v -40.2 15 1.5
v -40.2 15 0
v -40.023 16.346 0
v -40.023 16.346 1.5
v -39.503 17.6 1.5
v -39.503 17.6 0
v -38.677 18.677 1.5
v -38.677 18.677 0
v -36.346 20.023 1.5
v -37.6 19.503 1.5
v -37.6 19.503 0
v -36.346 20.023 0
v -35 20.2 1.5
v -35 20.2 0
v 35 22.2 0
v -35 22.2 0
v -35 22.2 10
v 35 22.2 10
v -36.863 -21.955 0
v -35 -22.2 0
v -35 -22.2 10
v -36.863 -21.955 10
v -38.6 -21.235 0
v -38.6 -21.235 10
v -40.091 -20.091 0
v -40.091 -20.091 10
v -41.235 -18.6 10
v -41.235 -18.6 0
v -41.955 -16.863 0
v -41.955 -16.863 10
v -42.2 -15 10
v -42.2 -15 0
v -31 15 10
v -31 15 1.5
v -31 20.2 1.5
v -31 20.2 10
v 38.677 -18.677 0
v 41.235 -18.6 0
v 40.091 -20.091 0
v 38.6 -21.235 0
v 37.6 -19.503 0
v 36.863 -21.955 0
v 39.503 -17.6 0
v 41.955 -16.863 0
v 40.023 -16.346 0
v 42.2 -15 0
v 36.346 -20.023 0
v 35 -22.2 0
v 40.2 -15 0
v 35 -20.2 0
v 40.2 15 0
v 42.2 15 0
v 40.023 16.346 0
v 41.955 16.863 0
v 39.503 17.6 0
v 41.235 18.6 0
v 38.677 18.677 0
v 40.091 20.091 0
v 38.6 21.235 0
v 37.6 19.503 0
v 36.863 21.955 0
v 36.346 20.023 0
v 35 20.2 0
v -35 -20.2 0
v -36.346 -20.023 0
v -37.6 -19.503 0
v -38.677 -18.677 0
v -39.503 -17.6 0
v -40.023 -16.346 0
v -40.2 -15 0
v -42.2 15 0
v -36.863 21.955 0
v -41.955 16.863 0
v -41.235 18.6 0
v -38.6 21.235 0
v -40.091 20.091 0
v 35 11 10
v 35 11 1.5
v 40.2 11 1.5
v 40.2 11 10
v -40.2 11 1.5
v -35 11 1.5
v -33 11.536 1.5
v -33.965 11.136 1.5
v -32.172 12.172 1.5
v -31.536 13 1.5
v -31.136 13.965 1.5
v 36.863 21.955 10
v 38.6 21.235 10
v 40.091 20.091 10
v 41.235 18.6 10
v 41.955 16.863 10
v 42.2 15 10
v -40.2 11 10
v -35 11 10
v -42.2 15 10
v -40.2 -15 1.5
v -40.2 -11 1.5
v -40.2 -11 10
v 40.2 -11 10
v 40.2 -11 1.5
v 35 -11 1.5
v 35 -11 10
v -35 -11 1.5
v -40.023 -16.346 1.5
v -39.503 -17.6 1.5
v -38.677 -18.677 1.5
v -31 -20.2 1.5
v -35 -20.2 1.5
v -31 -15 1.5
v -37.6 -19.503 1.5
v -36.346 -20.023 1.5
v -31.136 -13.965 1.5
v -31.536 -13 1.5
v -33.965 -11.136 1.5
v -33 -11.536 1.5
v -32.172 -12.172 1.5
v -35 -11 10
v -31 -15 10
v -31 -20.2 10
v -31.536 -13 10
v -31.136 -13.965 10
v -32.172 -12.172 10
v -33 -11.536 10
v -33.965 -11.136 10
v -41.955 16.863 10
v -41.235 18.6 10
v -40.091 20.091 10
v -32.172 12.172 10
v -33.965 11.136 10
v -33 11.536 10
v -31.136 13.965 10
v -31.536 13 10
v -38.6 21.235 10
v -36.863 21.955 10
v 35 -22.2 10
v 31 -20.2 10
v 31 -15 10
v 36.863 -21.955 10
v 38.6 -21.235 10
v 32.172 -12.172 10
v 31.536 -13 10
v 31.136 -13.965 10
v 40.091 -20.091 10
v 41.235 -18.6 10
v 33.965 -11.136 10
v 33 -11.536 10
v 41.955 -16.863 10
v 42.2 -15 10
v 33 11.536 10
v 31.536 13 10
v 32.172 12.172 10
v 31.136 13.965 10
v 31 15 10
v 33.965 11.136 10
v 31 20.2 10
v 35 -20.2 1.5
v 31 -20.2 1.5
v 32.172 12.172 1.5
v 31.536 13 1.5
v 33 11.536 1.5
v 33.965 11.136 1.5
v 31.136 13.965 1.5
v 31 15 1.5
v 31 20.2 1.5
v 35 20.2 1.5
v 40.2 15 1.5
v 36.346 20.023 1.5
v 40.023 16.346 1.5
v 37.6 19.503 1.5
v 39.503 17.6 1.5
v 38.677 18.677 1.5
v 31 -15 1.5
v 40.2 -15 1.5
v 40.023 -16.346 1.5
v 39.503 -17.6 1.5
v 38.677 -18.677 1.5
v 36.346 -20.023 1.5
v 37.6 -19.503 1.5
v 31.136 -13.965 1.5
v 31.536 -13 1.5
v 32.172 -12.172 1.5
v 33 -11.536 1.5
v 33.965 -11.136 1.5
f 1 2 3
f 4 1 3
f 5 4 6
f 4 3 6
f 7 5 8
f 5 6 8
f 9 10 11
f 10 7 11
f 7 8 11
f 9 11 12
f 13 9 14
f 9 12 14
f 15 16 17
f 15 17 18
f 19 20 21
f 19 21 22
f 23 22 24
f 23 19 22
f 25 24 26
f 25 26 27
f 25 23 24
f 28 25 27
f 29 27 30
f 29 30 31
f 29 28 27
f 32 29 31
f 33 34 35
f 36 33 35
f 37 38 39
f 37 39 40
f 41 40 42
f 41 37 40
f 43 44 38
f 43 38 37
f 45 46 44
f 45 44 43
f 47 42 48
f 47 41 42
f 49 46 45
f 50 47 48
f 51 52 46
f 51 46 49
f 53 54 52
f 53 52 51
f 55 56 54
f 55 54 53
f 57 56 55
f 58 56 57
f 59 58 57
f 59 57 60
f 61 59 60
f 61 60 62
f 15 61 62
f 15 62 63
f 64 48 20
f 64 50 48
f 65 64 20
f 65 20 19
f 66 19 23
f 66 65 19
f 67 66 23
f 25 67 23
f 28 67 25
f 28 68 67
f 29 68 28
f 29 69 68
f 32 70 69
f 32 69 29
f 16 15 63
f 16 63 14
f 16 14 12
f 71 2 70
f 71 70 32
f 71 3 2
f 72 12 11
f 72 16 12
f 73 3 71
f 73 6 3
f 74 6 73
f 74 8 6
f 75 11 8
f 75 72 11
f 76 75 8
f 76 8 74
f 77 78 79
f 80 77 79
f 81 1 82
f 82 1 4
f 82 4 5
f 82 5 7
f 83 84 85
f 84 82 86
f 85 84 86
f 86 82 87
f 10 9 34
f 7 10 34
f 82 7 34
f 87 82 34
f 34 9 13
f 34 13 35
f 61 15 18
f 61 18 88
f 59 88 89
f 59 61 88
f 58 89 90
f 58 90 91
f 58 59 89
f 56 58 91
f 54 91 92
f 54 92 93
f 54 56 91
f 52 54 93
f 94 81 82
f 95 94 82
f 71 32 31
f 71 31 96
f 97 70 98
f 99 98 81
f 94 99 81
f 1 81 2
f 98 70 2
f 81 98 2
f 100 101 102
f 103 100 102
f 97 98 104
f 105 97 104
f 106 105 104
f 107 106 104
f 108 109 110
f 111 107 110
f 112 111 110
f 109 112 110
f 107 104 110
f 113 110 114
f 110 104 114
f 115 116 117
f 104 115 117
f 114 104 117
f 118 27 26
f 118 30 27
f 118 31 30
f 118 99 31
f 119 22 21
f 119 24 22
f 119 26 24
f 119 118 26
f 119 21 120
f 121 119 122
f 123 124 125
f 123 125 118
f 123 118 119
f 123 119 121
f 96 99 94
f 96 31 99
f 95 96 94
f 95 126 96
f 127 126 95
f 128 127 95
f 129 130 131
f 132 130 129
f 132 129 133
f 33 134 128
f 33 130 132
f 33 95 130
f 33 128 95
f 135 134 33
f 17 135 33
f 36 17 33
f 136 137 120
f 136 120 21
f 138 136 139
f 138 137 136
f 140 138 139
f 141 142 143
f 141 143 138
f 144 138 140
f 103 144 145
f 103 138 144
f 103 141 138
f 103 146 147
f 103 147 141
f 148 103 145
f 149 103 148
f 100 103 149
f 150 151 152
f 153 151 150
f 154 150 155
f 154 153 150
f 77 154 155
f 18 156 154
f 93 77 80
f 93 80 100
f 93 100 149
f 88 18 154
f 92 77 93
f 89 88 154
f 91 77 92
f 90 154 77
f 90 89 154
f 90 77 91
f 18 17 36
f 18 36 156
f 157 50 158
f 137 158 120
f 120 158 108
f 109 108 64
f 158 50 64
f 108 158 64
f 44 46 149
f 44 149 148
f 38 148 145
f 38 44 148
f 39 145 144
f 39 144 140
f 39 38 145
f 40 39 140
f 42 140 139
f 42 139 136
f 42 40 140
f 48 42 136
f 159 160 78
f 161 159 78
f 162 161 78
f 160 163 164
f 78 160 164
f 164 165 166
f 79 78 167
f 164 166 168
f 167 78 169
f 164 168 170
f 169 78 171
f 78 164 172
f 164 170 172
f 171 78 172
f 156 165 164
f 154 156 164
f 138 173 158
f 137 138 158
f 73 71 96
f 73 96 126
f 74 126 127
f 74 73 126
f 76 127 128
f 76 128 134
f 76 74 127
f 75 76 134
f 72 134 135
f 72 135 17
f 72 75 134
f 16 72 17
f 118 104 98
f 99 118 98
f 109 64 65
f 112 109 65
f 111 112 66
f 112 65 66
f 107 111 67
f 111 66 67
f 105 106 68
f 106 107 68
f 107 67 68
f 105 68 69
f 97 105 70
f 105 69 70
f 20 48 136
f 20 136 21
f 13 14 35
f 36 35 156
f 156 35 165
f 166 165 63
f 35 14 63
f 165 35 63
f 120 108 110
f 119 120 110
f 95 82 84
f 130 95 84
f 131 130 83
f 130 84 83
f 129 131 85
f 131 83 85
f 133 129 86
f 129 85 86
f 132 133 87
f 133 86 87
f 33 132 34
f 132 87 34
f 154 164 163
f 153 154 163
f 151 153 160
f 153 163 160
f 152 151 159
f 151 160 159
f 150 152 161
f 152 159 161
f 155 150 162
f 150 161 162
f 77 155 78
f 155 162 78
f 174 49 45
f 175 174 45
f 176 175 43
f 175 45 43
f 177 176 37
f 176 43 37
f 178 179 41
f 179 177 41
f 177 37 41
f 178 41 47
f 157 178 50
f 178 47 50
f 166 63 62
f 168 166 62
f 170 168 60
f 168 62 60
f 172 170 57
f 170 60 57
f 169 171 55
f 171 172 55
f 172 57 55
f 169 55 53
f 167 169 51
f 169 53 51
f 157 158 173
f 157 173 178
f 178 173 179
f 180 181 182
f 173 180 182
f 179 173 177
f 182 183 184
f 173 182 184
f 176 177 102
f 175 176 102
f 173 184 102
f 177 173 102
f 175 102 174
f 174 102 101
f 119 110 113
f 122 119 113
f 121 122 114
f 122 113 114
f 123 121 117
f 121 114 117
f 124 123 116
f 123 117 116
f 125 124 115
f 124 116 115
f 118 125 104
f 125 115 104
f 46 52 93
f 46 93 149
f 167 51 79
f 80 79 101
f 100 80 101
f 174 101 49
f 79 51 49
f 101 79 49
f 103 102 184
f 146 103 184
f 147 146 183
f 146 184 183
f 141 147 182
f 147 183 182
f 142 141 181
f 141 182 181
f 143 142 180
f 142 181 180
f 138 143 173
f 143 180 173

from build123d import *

# Parameters (mm, degrees)
EXTRUDE_1_DEPTH = 10
EXTRUDE_START   = -1.5
EXTRUDE_2_DEPTH = 8.5


with BuildPart() as part:
    # Эскиз1 → Бобышка-Вытянуть1 (new body)
    with BuildSketch(Plane.XY):
        with BuildLine():
            Line((-35, 22.2), (35, 22.2))
            ThreePointArc((35, 22.2), (40.091168825, 20.091168825), (42.2, 15))
            Line((42.2, 15), (42.2, -15))
            ThreePointArc((42.2, -15), (40.091168825, -20.091168825), (35, -22.2))
            Line((35, -22.2), (-35, -22.2))
            ThreePointArc((-35, -22.2), (-40.091168825, -20.091168825), (-42.2, -15))
            Line((-42.2, -15), (-42.2, 15))
            ThreePointArc((-42.2, 15), (-40.091168825, 20.091168825), (-35, 22.2))
        make_face()
        with BuildLine():
            Line((-40.2, -15), (-40.2, 15))
            ThreePointArc((-40.2, 15), (-38.676955262, 18.676955262), (-35, 20.2))
            Line((-35, 20.2), (35, 20.2))
            ThreePointArc((35, 20.2), (38.676955262, 18.676955262), (40.2, 15))
            Line((40.2, 15), (40.2, -15))
            ThreePointArc((40.2, -15), (38.676955262, -18.676955262), (35, -20.2))
            Line((35, -20.2), (-35, -20.2))
            ThreePointArc((-35, -20.2), (-38.676955262, -18.676955262), (-40.2, -15))
        make_face(mode=Mode.SUBTRACT)
    extrude(amount=EXTRUDE_1_DEPTH)

    # Эскиз2 → Бобышка-Вытянуть2 (add)
    with BuildSketch(Plane(origin=(0, 0, 0), x_dir=(-1, 0, 0), z_dir=(0, 0, -1)).offset(EXTRUDE_START)):
        with BuildLine():
            Line((31, 15), (31, 20.2))
            Line((31, 20.2), (35, 20.2))
            ThreePointArc((35, 20.2), (38.676955262, 18.676955262), (40.2, 15))
            Line((40.2, 15), (40.2, 11))
            Line((40.2, 11), (35, 11))
            ThreePointArc((35, 11), (32.171572875, 12.171572875), (31, 15))
        make_face()
        with BuildLine():
            Line((-35, 20.2), (-31, 20.2))
            Line((-31, 20.2), (-31, 15))
            ThreePointArc((-31, 15), (-32.171572875, 12.171572875), (-35, 11))
            Line((-35, 11), (-40.2, 11))
            Line((-40.2, 11), (-40.2, 15))
            ThreePointArc((-40.2, 15), (-38.676955262, 18.676955262), (-35, 20.2))
        make_face()
        with BuildLine():
            Line((-31, -15), (-31, -20.2))
            Line((-31, -20.2), (-35, -20.2))
            ThreePointArc((-35, -20.2), (-38.676955262, -18.676955262), (-40.2, -15))
            Line((-40.2, -15), (-40.2, -11))
            Line((-40.2, -11), (-35, -11))
            ThreePointArc((-35, -11), (-32.171572875, -12.171572875), (-31, -15))
        make_face()
        with BuildLine():
            Line((35, -20.2), (31, -20.2))
            Line((31, -20.2), (31, -15))
            ThreePointArc((31, -15), (32.171572875, -12.171572875), (35, -11))
            Line((35, -11), (40.2, -11))
            Line((40.2, -11), (40.2, -15))
            ThreePointArc((40.2, -15), (38.676955262, -18.676955262), (35, -20.2))
        make_face()
    extrude(amount=-EXTRUDE_2_DEPTH)


solid = part.part
